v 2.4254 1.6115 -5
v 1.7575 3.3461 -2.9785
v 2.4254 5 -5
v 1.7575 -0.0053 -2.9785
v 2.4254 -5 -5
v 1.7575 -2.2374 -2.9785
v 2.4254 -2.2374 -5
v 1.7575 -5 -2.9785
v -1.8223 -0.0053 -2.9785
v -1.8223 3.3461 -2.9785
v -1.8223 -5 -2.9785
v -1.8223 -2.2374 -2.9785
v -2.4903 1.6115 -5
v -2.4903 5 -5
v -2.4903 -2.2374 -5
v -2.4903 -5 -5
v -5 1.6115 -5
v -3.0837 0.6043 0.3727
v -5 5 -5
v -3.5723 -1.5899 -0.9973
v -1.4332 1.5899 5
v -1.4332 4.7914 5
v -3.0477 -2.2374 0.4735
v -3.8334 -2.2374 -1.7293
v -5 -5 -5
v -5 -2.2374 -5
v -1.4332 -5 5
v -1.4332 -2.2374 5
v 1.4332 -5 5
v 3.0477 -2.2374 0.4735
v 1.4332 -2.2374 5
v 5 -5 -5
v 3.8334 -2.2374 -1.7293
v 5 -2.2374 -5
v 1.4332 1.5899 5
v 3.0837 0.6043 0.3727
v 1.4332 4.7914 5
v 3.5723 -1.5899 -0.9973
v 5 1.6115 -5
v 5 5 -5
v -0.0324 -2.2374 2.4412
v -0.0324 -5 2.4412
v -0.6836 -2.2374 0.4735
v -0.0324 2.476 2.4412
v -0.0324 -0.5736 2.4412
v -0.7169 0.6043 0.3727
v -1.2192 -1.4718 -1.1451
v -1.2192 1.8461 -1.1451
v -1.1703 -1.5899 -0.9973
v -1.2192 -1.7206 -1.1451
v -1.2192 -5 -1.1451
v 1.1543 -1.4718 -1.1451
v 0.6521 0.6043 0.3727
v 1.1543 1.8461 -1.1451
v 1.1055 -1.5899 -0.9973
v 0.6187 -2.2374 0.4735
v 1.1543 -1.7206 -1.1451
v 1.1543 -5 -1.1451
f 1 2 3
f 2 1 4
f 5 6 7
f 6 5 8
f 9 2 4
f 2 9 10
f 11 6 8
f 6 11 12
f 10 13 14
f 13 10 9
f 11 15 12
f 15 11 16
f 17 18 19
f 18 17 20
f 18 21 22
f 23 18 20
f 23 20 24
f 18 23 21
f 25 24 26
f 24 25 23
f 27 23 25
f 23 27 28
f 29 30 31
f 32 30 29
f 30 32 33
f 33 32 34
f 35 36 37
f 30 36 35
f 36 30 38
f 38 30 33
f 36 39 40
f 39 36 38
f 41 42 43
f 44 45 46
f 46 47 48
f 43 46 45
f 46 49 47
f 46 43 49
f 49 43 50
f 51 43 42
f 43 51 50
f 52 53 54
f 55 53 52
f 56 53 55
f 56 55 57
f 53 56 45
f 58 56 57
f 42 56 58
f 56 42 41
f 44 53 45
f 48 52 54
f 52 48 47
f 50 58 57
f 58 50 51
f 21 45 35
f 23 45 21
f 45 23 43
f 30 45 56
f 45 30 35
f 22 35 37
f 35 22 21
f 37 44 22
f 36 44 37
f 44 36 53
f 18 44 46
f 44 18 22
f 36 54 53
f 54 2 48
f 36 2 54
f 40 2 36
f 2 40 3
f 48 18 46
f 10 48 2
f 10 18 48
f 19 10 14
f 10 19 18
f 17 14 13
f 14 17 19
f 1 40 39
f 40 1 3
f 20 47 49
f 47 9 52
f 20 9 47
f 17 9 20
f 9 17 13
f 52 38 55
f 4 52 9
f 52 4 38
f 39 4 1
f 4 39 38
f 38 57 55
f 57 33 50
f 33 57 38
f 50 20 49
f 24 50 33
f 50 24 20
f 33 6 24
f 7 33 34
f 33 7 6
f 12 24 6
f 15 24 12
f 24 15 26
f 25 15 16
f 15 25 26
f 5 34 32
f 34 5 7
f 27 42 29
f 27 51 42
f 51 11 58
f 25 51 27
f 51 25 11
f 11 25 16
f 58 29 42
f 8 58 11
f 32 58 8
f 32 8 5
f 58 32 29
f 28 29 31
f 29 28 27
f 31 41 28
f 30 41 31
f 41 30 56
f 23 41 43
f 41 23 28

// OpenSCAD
// The letter visible when looking at the object from the front
first_letter = "A"; // [A,B,C,D,E,F,G,H,I,J,K,L,M,N,O,P,Q,R,S,T,U,V,W,X,Y,Z]
// The letter visible when looking at the object from the side
second_letter = "K"; // [A,B,C,D,E,F,G,H,I,J,K,L,M,N,O,P,Q,R,S,T,U,V,W,X,Y,Z]


module Letter(l)
{

fudge = 0.1;
h = 10;

if (l=="A") {
  scale([25.4/90, -25.4/90, 1]) union()
  {
    difference()
    {
       linear_extrude(height=h)
         polygon([[17.716535,17.716535],[8.594012,17.716535],[6.227213,10.553772],[-6.456999,10.553772],[-8.823799,17.716535],[-17.716535,17.716535],[-5.078280,-17.716535],[5.078280,-17.716535]]);
       translate([0, 0, -fudge])
         linear_extrude(height=h+2*fudge)
           polygon([[4.090198,4.057312],[-0.114893,-8.650048],[-4.319985,4.057312]]);
    }
  }
}	

if (l=="B") {
  scale([25.4/90, -25.4/90, 1]) union()
  {
    difference()
    {
       linear_extrude(height=h)
         polygon([[10.220524,-1.245972],[13.391886,-0.029652],[15.756040,1.910491],[17.226381,4.473643],[17.716535,7.558897],[17.453431,9.958880],[16.664180,12.032534],[15.348782,13.779861],[13.507237,15.200859],[11.128676,16.301468],[8.202343,17.087617],[4.728237,17.559306],[0.706356,17.716536],[-17.716535,17.716536],[-17.716535,-17.716536],[-1.052325,-17.716536],[3.120919,-17.577086],[6.674311,-17.158789],[9.607851,-16.461644],[11.921542,-15.485652],[13.687408,-14.202580],[14.948748,-12.584295],[15.705564,-10.630794],[15.957856,-8.342079],[15.590233,-5.945049],[14.487484,-3.927778],[12.685532,-2.355465]]);
       translate([0, 0, -fudge])
         linear_extrude(height=h+2*fudge)
           polygon([[-0.475709,-3.998977],[1.830738,-4.236288],[3.502944,-4.948289],[4.519210,-6.123045],[4.857993,-7.748759],[4.519210,-9.356636],[3.502944,-10.525497],[1.830738,-11.255259],[-0.475709,-11.498542],[-6.616672,-11.498542],[-6.616672,-3.998977]]);
       translate([0, 0, -fudge])
         linear_extrude(height=h+2*fudge)
           polygon([[-0.100907,11.498542],[2.825400,11.207820],[4.915654,10.335634],[6.191395,8.876074],[6.616672,6.823180],[6.198603,4.811835],[4.944484,3.381924],[2.847024,2.509755],[-0.100907,2.219017],[-6.616672,2.219017],[-6.616672,11.498542]]);
    }
  }
}	

if (l=="C") {
  scale([25.4/90, -25.4/90, 1]) union()
  {
    linear_extrude(height=h)
      polygon([[3.207422,17.716536],[-1.190753,17.435956],[-5.244756,16.594222],[-8.830745,15.197056],[-11.879853,13.250182],[-14.350811,10.753610],[-16.202302,7.707323],[-17.337979,4.128524],[-17.716536,0.034357],[-17.351745,-3.830741],[-16.257365,-7.317948],[-14.467820,-10.381388],[-12.017510,-12.975329],[-9.030348,-14.985164],[-5.409944,-16.479699],[-1.266465,-17.407300],[3.234953,-17.716536],[7.887781,-17.464587],[11.742194,-16.846169],[15.073509,-15.861281],[17.716536,-14.876393],[17.716536,-6.607913],[16.505148,-6.607913],[14.550410,-7.913462],[11.907384,-9.402247],[8.631132,-10.639083],[4.859314,-11.142979],[2.684305,-10.994080],[0.619458,-10.547465],[-1.314645,-9.780149],[-3.097296,-8.623498],[-4.570245,-7.106065],[-5.740322,-5.164937],[-6.483684,-2.782867],[-6.731457,0.057261],[-6.463036,3.000484],[-5.657729,5.416885],[-4.418822,7.340860],[-2.904577,8.806733],[-1.128807,9.888970],[0.839711,10.616179],[4.914376,11.142979],[8.713727,10.661988],[12.210231,9.356438],[14.715598,7.936367],[16.615275,6.630817],[17.716536,6.630817],[17.716536,14.784775],[14.770662,15.861281],[11.824789,16.731647],[8.052970,17.464587]]);
  }
}	

if (l=="D") {
  scale([25.4/90, -25.4/90, 1]) union()
  {
    difference()
    {
       linear_extrude(height=h)
         polygon([[17.716536,0.035695],[17.566987,2.446591],[17.118400,4.729575],[16.370775,6.884647],[15.324111,8.911809],[12.616867,12.362314],[9.280090,14.908541],[6.402863,16.241150],[3.261253,17.097824],[-0.314809,17.561857],[-4.495240,17.716535],[-17.716536,17.716535],[-17.716536,-17.716535],[-4.117490,-17.716535],[0.151083,-17.532085],[3.790105,-16.978842],[6.849868,-16.110242],[9.380824,-14.932338],[12.843518,-12.302796],[15.475212,-8.888013],[16.455769,-6.911399],[17.156175,-4.765243],[17.716536,0.035695]]);
       translate([0, 0, -fudge])
         linear_extrude(height=h+2*fudge)
           polygon([[7.718718,-0.035695],[7.378719,-3.277960],[6.358813,-6.008630],[4.627433,-8.233589],[2.102816,-9.911265],[-0.944378,-10.839331],[-5.603310,-11.101093],[-8.046103,-11.101093],[-8.046103,11.077296],[-5.603310,11.077296],[-0.541443,10.791737],[2.606484,9.697096],[4.898155,8.031344],[6.484731,5.889647],[7.410199,3.206596],[7.718718,-0.035695]]);
    }
  }
}	

if (l=="E") {
  scale([25.4/90, -25.4/90, 1]) union()
  {
    linear_extrude(height=h)
      polygon([[17.716535,17.716535],[-17.716535,17.716535],[-17.716535,-17.716535],[17.716535,-17.716535],[17.716535,-10.863127],[-5.148817,-10.863127],[-5.148817,-4.747413],[16.071547,-4.747413],[16.071547,2.105995],[-5.148817,2.105995],[-5.148817,10.863127],[17.716535,10.863127],[17.716535,17.716535]]);
  }
}	

if (l=="F") {
  scale([25.4/90, -25.4/90, 1]) union()
  {
    linear_extrude(height=h)
      polygon([[17.716536,-10.863127],[-5.031031,-10.863127],[-5.031031,-4.271482],[16.056129,-4.271482],[16.056129,2.581926],[-5.031031,2.581926],[-5.031031,17.716535],[-17.716536,17.716535],[-17.716536,-17.716535],[17.716536,-17.716535],[17.716536,-10.863127]]);
  }
}	

if (l=="G") {
scale([25.4/90, -25.4/90, 1]) union()
  {
    linear_extrude(height=h)
      polygon([[17.716536,15.063058],[11.028669,16.847293],[6.870815,17.499224],[2.725621,17.716535],[-1.809203,17.422021],[-5.823501,16.538482],[-9.317277,15.065917],[-12.290531,13.004326],[-14.664411,10.412329],[-16.360038,7.371412],[-17.377412,3.881574],[-17.716536,-0.057187],[-17.374258,-3.832946],[-16.347419,-7.222701],[-14.636019,-10.226452],[-12.240057,-12.844202],[-9.232102,-14.975829],[-5.684697,-16.498426],[-1.597841,-17.411995],[3.028467,-17.716535],[6.649990,-17.562104],[10.094892,-17.098915],[13.640697,-16.201054],[17.565112,-14.697061],[17.565112,-6.713755],[16.479911,-6.713755],[14.410459,-8.063368],[11.785787,-9.573105],[8.353523,-10.831219],[4.214617,-11.357340],[1.760280,-11.185757],[-0.454270,-10.671095],[-2.441716,-9.801833],[-4.214618,-8.566614],[-5.640533,-7.005390],[-6.738341,-5.066769],[-7.419756,-2.796430],[-7.646882,-0.194436],[-7.440259,2.464767],[-6.820372,4.792280],[-5.787220,6.788104],[-4.340804,8.452240],[-2.490610,9.763256],[-0.246078,10.699694],[2.392793,11.261555],[5.426004,11.448839],[6.637392,11.425966],[7.874016,11.357346],[7.874016,4.677904],[0.378558,4.677904],[0.378558,-1.749917],[17.716536,-1.749917],[17.716536,15.063063]]);
  }  
}	

if (l=="H") {
  scale([25.4/90, -25.4/90, 1]) union()
  {
    linear_extrude(height=h)
      polygon([[17.716535,17.716535],[7.524551,17.716535],[7.524551,2.105995],[-7.524551,2.105995],[-7.524551,17.716535],[-17.716535,17.716535],[-17.716535,-17.716535],[-7.524551,-17.716535],[-7.524551,-4.747413],[7.524551,-4.747413],[7.524551,-17.716535],[17.716535,-17.716535]]);
  }
}	

if (l=="I") {
  scale([25.4/90, -25.4/90, 1]) union()
  {
    linear_extrude(height=h)
      polygon([[17.716535,17.716536],[-17.716535,17.716536],[-17.716535,14.099460],[-5.965771,14.099460],[-5.965771,-14.099460],[-17.716535,-14.099460],[-17.716535,-17.716536],[17.716535,-17.716536],[17.716535,-14.099460],[5.965774,-14.099460],[5.965774,14.099460],[17.716535,14.099460]]);
  }
}	

if (l=="J") {
  scale([25.4/90, -25.4/90, 1]) union()
  {
    linear_extrude(height=h)
      polygon([[17.716535,8.142567],[17.337955,10.310205],[16.202273,12.213853],[14.309489,13.853511],[11.659600,15.229180],[8.397673,16.317398],[4.618394,17.094696],[0.321762,17.561075],[-4.492227,17.716535],[-10.952958,17.505345],[-17.716535,17.036033],[-17.716535,12.694894],[-17.161316,12.694894],[-12.063396,13.375398],[-5.855038,13.727381],[-1.690908,13.604190],[1.514235,13.234603],[3.924371,12.636234],[5.602665,11.826667],[6.713082,10.782453],[7.318795,9.527038],[7.722591,6.382646],[7.722591,-14.008969],[-8.176863,-14.008969],[-8.176863,-17.716535],[17.716535,-17.716535],[17.716535,8.142567]]);
  }
}	

if (l=="K") {
  scale([25.4/90, -25.4/90, 1]) union()
  {
    linear_extrude(height=h)
      polygon([[17.716535,17.716535],[5.710077,17.716535],[-5.633603,3.533788],[-7.927830,6.127614],[-7.927830,17.716535],[-17.716535,17.716535],[-17.716535,-17.716535],[-7.927830,-17.716535],[-7.927830,-1.677657],[5.633604,-17.716535],[16.977285,-17.716535],[2.141279,-1.320709]]);
  }
}	

if (l=="L") {
  scale([25.4/90, -25.4/90, 1]) union()
  {
    linear_extrude(height=h)
      polygon([[17.716535,17.716535],[-17.716535,17.716535],[-17.716535,-17.716535],[-5.047729,-17.716535],[-5.047729,10.863127],[17.716535,10.863127]]);
  }
}	

if (l=="M") {
  scale([25.4/90, -25.4/90, 1]) union()
  {
    linear_extrude(height=h)
      polygon([[17.716536,17.716535],[9.045535,17.716535],[9.045535,-6.008630],[2.780623,9.387740],[-3.234602,9.387740],[-9.499513,-6.008630],[-9.499513,17.716535],[-17.716536,17.716535],[-17.716536,-17.716535],[-7.592801,-17.716535],[0.011349,0.059491],[7.592802,-17.716535],[17.716536,-17.716535]]);
  }
}	

if (l=="N") {
  scale([25.4/90, -25.4/90, 1]) union()
  {
    linear_extrude(height=h)
      polygon([[17.716536,17.716535],[8.033939,17.716535],[-8.504983,-6.603544],[-8.504983,17.716535],[-17.716536,17.716535],[-17.716536,-17.716535],[-5.704882,-17.716535],[8.504984,2.581926],[8.504984,-17.716535],[17.716536,-17.716535],[17.716536,17.716535]]);
  }
}	

if (l=="O") {
  scale([25.4/90, -25.4/90, 1]) union()
  {
    difference()
    {
       linear_extrude(height=h)
         polygon([[17.716535,0.011423],[17.422201,3.869430],[16.539252,7.310505],[15.067691,10.334650],[13.007515,12.941866],[10.427925,15.030785],[7.398219,16.522868],[3.918398,17.418119],[-0.011542,17.716535],[-3.931405,17.418119],[-7.404021,16.522868],[-10.429391,15.030785],[-13.007515,12.941866],[-15.067713,10.334650],[-16.539283,7.310505],[-17.422223,3.869430],[-17.716535,0.011423],[-17.422223,-3.873694],[-16.539283,-7.327614],[-15.067713,-10.350337],[-13.007515,-12.941866],[-10.429391,-15.030765],[-7.404021,-16.522843],[-3.931405,-17.418099],[-0.011542,-17.716535],[3.899642,-17.418099],[7.369365,-16.522843],[10.397627,-15.030765],[12.984431,-12.941866],[15.054706,-10.350337],[16.533482,-7.327614],[17.420758,-3.873694],[17.716535,0.011423]]);
       translate([0, 0, -fudge])
         linear_extrude(height=h+2*fudge)
           polygon([[5.967067,8.624104],[7.092364,6.933558],[7.882992,4.968855],[8.350411,2.661489],[8.506245,-0.011423],[8.327327,-2.844226],[7.790658,-5.220153],[6.965405,-7.161985],[5.920901,-8.692639],[4.651293,-9.874864],[3.197055,-10.680181],[1.638907,-11.142777],[0.011542,-11.297004],[-1.627396,-11.148488],[-3.173973,-10.703026],[-4.593615,-9.914843],[-5.897817,-8.738330],[-6.948124,-7.213387],[-7.790660,-5.197307],[-8.327357,-2.775690],[-8.506245,0.011423],[-8.333129,2.827117],[-7.813743,5.197307],[-6.988520,7.127743],[-5.943985,8.669794],[-4.691720,9.840621],[-3.243222,10.657336],[-1.656251,11.137091],[0.011542,11.297004],[1.679303,11.137091],[3.266305,10.657336],[4.714772,9.817776],[5.967067,8.624104]]);
    }
  }
}	

if (l=="P") {
  scale([25.4/90, -25.4/90, 1]) union()
  {
    difference()
    {
       linear_extrude(height=h)
         polygon([[17.716536,-6.532154],[17.464235,-4.176279],[16.707457,-1.868029],[15.482118,0.214182],[13.824375,1.939420],[11.107045,3.777714],[8.087043,5.104361],[4.555248,5.907504],[0.245061,6.175206],[-6.645504,6.175206],[-6.645504,17.716535],[-17.716536,17.716535],[-17.716536,-17.716535],[0.504538,-17.716535],[4.274147,-17.567780],[7.395103,-17.121621],[10.054721,-16.401749],[12.382834,-15.384472],[14.667648,-13.784130],[16.332657,-11.791193],[17.370535,-9.381771]]);
       translate([0, 0, -fudge])
         linear_extrude(height=h+2*fudge)
           polygon([[6.270701,-6.317985],[6.025618,-7.710064],[5.290454,-8.888013],[4.230901,-9.816058],[3.012820,-10.410992],[-0.360385,-11.029703],[-4.742669,-11.101093],[-6.645504,-11.101093],[-6.645504,-0.487829],[-3.474113,-0.487829],[1.167647,-0.773388],[2.861438,-1.201712],[4.252545,-1.915623],[5.167902,-2.748487],[5.780578,-3.724161],[6.270701,-6.317985]]);
    }
  }
}	

if (l=="Q") {
  scale([25.4/90, -25.4/90, 1]) union()
  {
    difference()
    {
       linear_extrude(height=h)
         polygon([[6.913489,9.646175],[7.271261,11.194663],[8.159993,12.233062],[9.723874,12.820575],[12.107261,13.016416],[14.346354,12.761371],[16.146862,12.305932],[17.024032,12.305932],[17.024032,17.115357],[14.207854,17.534360],[9.591167,17.716535],[7.017344,17.579898],[4.789813,17.170009],[2.925808,16.527837],[1.396548,15.657955],[0.225048,14.605891],[-0.611711,13.380766],[-1.142644,11.996233],[-1.396548,10.465963],[-5.039409,10.082257],[-8.258107,9.277271],[-11.052643,8.051004],[-13.423017,6.403457],[-15.301433,4.379039],[-16.643158,2.040367],[-17.448192,-0.612559],[-17.716535,-3.579742],[-17.422223,-6.677848],[-16.539283,-9.432105],[-15.067713,-11.842513],[-13.007515,-13.909074],[-10.429391,-15.574824],[-7.404021,-16.764650],[-3.931405,-17.478554],[-0.011542,-17.716535],[3.899642,-17.478554],[7.369365,-16.764650],[10.397627,-15.574824],[12.984431,-13.909074],[15.054706,-11.842513],[16.533482,-9.432105],[17.420758,-6.677848],[17.716535,-3.579742],[17.543388,-1.247895],[17.024004,0.919991],[16.158382,2.923916],[14.946523,4.763881],[13.405686,6.380687],[11.553235,7.733337],[9.389169,8.821833]]);
       translate([0, 0, -fudge])
         linear_extrude(height=h+2*fudge)
           polygon([[5.967067,3.288262],[7.092364,1.940171],[7.882992,0.373459],[8.350411,-1.466502],[8.506245,-3.597960],[8.327327,-5.856920],[7.790658,-7.751554],[6.965406,-9.300028],[5.920901,-10.520616],[4.651293,-11.463357],[3.197055,-12.105540],[0.011542,-12.597413],[-3.173973,-12.123758],[-4.593615,-11.495237],[-5.897817,-10.557051],[-6.948124,-9.341017],[-7.790660,-7.733336],[-8.327357,-5.802267],[-8.506245,-3.579742],[-8.333128,-1.334425],[-7.813743,0.555634],[-6.988520,2.095020],[-5.943985,3.324697],[-4.691720,4.258349],[-3.243222,4.909621],[0.011542,5.419711],[3.266305,4.909621],[4.714772,4.240131],[5.967067,3.288262]]);
    }
  }
}	

if (l=="R") {
  scale([25.4/90, -25.4/90, 1]) union()
  {
    difference()
    {
       linear_extrude(height=h)
         polygon([[17.716535,17.716535],[6.127895,17.716535],[-3.904061,4.723616],[-8.277600,4.723616],[-8.277600,17.716535],[-17.716535,17.716535],[-17.716535,-17.716535],[-1.803775,-17.716535],[3.805226,-17.359587],[6.078456,-16.794393],[8.203472,-15.812811],[10.062819,-14.444485],[11.489803,-12.719259],[12.416374,-10.595395],[12.725266,-7.983744],[12.249587,-4.420194],[10.822654,-1.582471],[8.537024,0.684163],[5.436036,2.534333]]);
       translate([0, 0, -fudge])
         linear_extrude(height=h+2*fudge)
           polygon([[2.915693,-6.865306],[2.773595,-8.102708],[2.347380,-9.149775],[1.575197,-10.000481],[0.395348,-10.648958],[-1.853194,-11.101093],[-4.843014,-11.196279],[-8.277600,-11.196279],[-8.277600,-1.653861],[-5.361908,-1.653861],[-1.556683,-1.868030],[-0.148272,-2.219014],[1.013079,-2.843688],[2.446217,-4.461854]]);
    }
  }
}	

if (l=="S") {
 scale([25.4/90, -25.4/90, 1]) union()
  {
    linear_extrude(height=h)
      polygon([[17.716536,6.349477],[17.391201,8.757804],[16.415254,10.930750],[14.788695,12.868315],[12.511522,14.570500],[9.689803,15.946890],[6.401870,16.930026],[2.647724,17.519907],[-1.572638,17.716535],[-6.394943,17.532824],[-10.563119,16.981695],[-17.716536,15.075703],[-17.716536,6.877644],[-16.547495,6.877644],[-13.040378,8.806605],[-9.143569,10.230351],[-5.107607,11.108719],[-1.238627,11.401503],[1.322130,11.263720],[3.910720,10.804445],[5.914790,9.771076],[6.520166,9.001796],[6.721986,7.933976],[6.429704,6.889133],[5.552944,6.005021],[4.140334,5.275930],[2.184994,4.742014],[-2.769514,3.892356],[-7.640516,2.858987],[-12.142722,1.211350],[-13.845832,0.202377],[-15.183614,-0.930032],[-16.182172,-2.207379],[-16.895427,-3.628258],[-17.323378,-5.192667],[-17.466027,-6.900608],[-17.142455,-9.178309],[-16.171735,-11.234995],[-14.553865,-13.070664],[-12.288846,-14.685320],[-9.501944,-16.011457],[-6.346232,-16.958705],[-2.821711,-17.527064],[1.071621,-17.716535],[5.135410,-17.550022],[9.143569,-17.050586],[16.074313,-15.420160],[16.074313,-7.543593],[14.933105,-7.543593],[12.142692,-9.059181],[8.781724,-10.299243],[5.121494,-11.143140],[1.377799,-11.424467],[-1.294294,-11.263721],[-3.827217,-10.712591],[-5.692116,-9.656258],[-6.276647,-8.915657],[-6.471476,-8.071759],[-6.158351,-6.871885],[-5.218933,-5.982058],[-3.409715,-5.298869],[-0.487100,-4.673124],[3.882886,-3.915320],[8.419878,-2.904915],[12.553248,-1.383552],[15.434123,0.608539],[16.432658,1.794051],[17.145904,3.146044],[17.573864,4.664520],[17.716536,6.349477]]);
  } 
}	

if (l=="T") {
  scale([25.4/90, -25.4/90, 1]) union()
  {
    linear_extrude(height=h)
      polygon([[17.716535,-10.863127],[5.177435,-10.863127],[5.177435,17.716535],[-5.177435,17.716535],[-5.177435,-10.863127],[-17.716535,-10.863127],[-17.716535,-17.716535],[17.716535,-17.716535]]);
  }
}	

if (l=="U") {
  scale([25.4/90, -25.4/90, 1]) union()
  {
    linear_extrude(height=h)
      polygon([[17.716535,4.429134],[17.435722,7.458141],[16.593344,10.111251],[15.189400,12.388465],[13.223889,14.289784],[10.711800,15.788988],[7.668228,16.859847],[4.093171,17.502363],[-0.013371,17.716535],[-4.119939,17.502363],[-7.695004,16.859847],[-10.738567,15.788988],[-13.250631,14.289784],[-15.204467,12.389922],[-16.600063,10.117079],[-17.437419,7.471254],[-17.716535,4.452445],[-17.716535,-17.716535],[-7.394147,-17.716535],[-7.394147,3.939598],[-6.959601,7.092449],[-6.416403,8.323571],[-5.655920,9.324492],[-4.651436,10.099594],[-3.376184,10.653237],[-0.013371,11.096146],[3.315981,10.670720],[4.589571,10.138932],[5.602437,9.394426],[6.386293,8.415359],[6.946197,7.179866],[7.394147,3.939598],[7.394147,-17.716535],[17.716535,-17.716535],[17.716535,4.429134]]);
  }
}	

if (l=="V") {
  scale([25.4/90, -25.4/90, 1]) union()
  {
    linear_extrude(height=h)
      polygon([[17.716536,-17.716535],[5.025139,17.716535],[-5.025139,17.716535],[-17.716536,-17.716535],[-8.297323,-17.716535],[0.116863,7.174661],[8.531049,-17.716535],[17.716536,-17.716535]]);
  }
}	

if (l=="W") {
  scale([25.4/90, -25.4/90, 1]) union()
  {
    linear_extrude(height=h)
      polygon([[17.716535,-17.716535],[11.195809,17.716535],[4.284816,17.716535],[-0.056915,-5.366123],[-4.284817,17.716535],[-11.195810,17.716535],[-17.716535,-17.716535],[-11.195810,-17.716535],[-7.472004,6.674934],[-3.016446,-17.716535],[3.211579,-17.716535],[7.455742,6.674934],[11.358421,-17.716535],[17.716535,-17.716535]]);
  }
}	

if (l=="X") {
  scale([25.4/90, -25.4/90, 1]) union()
  {
    linear_extrude(height=h)
      polygon([[17.716536,17.716535],[7.339040,17.716535],[-0.163609,6.056224],[-7.806495,17.716535],[-17.716536,17.716535],[-5.375730,-0.130881],[-17.459435,-17.716535],[-7.105312,-17.716535],[0.140236,-6.674933],[7.596140,-17.716535],[17.529554,-17.716535],[5.375730,-0.487829],[17.716536,17.716535]]);
  }
}	

if (l=="Y") {
scale([25.4/90, -25.4/90, 1]) union()
  {
    linear_extrude(height=h)
      polygon([[17.716535,-17.716535],[4.669751,4.009719],[4.669751,17.716535],[-4.455869,17.716535],[-4.455869,4.438058],[-17.716535,-17.716535],[-7.355154,-17.716535],[0.297058,-4.009719],[7.687860,-17.716535],[17.716535,-17.716535]]);
  }  
}	


if (l=="Z") {
scale([25.4/90, -25.4/90, 1]) union()
  {
    linear_extrude(height=h)
      polygon([[17.716535,17.716535],[-17.716535,17.716535],[-17.716535,11.077296],[3.299723,-10.863127],[-16.696878,-10.863127],[-16.696878,-17.716535],[16.583583,-17.716535],[16.583583,-10.958314],[-4.404350,10.863127],[17.716535,10.863127]]);
  }

}
}

// HERE GOES THE ACTUAL OUTPUT

render (convexity=5) intersection ()
{
	translate ([0,5,0]) rotate (a=90,v=[1,0,0]) Letter(first_letter);
	rotate (a=90, v=[0,0,1]) translate ([0,5,0]) rotate (a=90,v=[1,0,0]) Letter(second_letter);

}
